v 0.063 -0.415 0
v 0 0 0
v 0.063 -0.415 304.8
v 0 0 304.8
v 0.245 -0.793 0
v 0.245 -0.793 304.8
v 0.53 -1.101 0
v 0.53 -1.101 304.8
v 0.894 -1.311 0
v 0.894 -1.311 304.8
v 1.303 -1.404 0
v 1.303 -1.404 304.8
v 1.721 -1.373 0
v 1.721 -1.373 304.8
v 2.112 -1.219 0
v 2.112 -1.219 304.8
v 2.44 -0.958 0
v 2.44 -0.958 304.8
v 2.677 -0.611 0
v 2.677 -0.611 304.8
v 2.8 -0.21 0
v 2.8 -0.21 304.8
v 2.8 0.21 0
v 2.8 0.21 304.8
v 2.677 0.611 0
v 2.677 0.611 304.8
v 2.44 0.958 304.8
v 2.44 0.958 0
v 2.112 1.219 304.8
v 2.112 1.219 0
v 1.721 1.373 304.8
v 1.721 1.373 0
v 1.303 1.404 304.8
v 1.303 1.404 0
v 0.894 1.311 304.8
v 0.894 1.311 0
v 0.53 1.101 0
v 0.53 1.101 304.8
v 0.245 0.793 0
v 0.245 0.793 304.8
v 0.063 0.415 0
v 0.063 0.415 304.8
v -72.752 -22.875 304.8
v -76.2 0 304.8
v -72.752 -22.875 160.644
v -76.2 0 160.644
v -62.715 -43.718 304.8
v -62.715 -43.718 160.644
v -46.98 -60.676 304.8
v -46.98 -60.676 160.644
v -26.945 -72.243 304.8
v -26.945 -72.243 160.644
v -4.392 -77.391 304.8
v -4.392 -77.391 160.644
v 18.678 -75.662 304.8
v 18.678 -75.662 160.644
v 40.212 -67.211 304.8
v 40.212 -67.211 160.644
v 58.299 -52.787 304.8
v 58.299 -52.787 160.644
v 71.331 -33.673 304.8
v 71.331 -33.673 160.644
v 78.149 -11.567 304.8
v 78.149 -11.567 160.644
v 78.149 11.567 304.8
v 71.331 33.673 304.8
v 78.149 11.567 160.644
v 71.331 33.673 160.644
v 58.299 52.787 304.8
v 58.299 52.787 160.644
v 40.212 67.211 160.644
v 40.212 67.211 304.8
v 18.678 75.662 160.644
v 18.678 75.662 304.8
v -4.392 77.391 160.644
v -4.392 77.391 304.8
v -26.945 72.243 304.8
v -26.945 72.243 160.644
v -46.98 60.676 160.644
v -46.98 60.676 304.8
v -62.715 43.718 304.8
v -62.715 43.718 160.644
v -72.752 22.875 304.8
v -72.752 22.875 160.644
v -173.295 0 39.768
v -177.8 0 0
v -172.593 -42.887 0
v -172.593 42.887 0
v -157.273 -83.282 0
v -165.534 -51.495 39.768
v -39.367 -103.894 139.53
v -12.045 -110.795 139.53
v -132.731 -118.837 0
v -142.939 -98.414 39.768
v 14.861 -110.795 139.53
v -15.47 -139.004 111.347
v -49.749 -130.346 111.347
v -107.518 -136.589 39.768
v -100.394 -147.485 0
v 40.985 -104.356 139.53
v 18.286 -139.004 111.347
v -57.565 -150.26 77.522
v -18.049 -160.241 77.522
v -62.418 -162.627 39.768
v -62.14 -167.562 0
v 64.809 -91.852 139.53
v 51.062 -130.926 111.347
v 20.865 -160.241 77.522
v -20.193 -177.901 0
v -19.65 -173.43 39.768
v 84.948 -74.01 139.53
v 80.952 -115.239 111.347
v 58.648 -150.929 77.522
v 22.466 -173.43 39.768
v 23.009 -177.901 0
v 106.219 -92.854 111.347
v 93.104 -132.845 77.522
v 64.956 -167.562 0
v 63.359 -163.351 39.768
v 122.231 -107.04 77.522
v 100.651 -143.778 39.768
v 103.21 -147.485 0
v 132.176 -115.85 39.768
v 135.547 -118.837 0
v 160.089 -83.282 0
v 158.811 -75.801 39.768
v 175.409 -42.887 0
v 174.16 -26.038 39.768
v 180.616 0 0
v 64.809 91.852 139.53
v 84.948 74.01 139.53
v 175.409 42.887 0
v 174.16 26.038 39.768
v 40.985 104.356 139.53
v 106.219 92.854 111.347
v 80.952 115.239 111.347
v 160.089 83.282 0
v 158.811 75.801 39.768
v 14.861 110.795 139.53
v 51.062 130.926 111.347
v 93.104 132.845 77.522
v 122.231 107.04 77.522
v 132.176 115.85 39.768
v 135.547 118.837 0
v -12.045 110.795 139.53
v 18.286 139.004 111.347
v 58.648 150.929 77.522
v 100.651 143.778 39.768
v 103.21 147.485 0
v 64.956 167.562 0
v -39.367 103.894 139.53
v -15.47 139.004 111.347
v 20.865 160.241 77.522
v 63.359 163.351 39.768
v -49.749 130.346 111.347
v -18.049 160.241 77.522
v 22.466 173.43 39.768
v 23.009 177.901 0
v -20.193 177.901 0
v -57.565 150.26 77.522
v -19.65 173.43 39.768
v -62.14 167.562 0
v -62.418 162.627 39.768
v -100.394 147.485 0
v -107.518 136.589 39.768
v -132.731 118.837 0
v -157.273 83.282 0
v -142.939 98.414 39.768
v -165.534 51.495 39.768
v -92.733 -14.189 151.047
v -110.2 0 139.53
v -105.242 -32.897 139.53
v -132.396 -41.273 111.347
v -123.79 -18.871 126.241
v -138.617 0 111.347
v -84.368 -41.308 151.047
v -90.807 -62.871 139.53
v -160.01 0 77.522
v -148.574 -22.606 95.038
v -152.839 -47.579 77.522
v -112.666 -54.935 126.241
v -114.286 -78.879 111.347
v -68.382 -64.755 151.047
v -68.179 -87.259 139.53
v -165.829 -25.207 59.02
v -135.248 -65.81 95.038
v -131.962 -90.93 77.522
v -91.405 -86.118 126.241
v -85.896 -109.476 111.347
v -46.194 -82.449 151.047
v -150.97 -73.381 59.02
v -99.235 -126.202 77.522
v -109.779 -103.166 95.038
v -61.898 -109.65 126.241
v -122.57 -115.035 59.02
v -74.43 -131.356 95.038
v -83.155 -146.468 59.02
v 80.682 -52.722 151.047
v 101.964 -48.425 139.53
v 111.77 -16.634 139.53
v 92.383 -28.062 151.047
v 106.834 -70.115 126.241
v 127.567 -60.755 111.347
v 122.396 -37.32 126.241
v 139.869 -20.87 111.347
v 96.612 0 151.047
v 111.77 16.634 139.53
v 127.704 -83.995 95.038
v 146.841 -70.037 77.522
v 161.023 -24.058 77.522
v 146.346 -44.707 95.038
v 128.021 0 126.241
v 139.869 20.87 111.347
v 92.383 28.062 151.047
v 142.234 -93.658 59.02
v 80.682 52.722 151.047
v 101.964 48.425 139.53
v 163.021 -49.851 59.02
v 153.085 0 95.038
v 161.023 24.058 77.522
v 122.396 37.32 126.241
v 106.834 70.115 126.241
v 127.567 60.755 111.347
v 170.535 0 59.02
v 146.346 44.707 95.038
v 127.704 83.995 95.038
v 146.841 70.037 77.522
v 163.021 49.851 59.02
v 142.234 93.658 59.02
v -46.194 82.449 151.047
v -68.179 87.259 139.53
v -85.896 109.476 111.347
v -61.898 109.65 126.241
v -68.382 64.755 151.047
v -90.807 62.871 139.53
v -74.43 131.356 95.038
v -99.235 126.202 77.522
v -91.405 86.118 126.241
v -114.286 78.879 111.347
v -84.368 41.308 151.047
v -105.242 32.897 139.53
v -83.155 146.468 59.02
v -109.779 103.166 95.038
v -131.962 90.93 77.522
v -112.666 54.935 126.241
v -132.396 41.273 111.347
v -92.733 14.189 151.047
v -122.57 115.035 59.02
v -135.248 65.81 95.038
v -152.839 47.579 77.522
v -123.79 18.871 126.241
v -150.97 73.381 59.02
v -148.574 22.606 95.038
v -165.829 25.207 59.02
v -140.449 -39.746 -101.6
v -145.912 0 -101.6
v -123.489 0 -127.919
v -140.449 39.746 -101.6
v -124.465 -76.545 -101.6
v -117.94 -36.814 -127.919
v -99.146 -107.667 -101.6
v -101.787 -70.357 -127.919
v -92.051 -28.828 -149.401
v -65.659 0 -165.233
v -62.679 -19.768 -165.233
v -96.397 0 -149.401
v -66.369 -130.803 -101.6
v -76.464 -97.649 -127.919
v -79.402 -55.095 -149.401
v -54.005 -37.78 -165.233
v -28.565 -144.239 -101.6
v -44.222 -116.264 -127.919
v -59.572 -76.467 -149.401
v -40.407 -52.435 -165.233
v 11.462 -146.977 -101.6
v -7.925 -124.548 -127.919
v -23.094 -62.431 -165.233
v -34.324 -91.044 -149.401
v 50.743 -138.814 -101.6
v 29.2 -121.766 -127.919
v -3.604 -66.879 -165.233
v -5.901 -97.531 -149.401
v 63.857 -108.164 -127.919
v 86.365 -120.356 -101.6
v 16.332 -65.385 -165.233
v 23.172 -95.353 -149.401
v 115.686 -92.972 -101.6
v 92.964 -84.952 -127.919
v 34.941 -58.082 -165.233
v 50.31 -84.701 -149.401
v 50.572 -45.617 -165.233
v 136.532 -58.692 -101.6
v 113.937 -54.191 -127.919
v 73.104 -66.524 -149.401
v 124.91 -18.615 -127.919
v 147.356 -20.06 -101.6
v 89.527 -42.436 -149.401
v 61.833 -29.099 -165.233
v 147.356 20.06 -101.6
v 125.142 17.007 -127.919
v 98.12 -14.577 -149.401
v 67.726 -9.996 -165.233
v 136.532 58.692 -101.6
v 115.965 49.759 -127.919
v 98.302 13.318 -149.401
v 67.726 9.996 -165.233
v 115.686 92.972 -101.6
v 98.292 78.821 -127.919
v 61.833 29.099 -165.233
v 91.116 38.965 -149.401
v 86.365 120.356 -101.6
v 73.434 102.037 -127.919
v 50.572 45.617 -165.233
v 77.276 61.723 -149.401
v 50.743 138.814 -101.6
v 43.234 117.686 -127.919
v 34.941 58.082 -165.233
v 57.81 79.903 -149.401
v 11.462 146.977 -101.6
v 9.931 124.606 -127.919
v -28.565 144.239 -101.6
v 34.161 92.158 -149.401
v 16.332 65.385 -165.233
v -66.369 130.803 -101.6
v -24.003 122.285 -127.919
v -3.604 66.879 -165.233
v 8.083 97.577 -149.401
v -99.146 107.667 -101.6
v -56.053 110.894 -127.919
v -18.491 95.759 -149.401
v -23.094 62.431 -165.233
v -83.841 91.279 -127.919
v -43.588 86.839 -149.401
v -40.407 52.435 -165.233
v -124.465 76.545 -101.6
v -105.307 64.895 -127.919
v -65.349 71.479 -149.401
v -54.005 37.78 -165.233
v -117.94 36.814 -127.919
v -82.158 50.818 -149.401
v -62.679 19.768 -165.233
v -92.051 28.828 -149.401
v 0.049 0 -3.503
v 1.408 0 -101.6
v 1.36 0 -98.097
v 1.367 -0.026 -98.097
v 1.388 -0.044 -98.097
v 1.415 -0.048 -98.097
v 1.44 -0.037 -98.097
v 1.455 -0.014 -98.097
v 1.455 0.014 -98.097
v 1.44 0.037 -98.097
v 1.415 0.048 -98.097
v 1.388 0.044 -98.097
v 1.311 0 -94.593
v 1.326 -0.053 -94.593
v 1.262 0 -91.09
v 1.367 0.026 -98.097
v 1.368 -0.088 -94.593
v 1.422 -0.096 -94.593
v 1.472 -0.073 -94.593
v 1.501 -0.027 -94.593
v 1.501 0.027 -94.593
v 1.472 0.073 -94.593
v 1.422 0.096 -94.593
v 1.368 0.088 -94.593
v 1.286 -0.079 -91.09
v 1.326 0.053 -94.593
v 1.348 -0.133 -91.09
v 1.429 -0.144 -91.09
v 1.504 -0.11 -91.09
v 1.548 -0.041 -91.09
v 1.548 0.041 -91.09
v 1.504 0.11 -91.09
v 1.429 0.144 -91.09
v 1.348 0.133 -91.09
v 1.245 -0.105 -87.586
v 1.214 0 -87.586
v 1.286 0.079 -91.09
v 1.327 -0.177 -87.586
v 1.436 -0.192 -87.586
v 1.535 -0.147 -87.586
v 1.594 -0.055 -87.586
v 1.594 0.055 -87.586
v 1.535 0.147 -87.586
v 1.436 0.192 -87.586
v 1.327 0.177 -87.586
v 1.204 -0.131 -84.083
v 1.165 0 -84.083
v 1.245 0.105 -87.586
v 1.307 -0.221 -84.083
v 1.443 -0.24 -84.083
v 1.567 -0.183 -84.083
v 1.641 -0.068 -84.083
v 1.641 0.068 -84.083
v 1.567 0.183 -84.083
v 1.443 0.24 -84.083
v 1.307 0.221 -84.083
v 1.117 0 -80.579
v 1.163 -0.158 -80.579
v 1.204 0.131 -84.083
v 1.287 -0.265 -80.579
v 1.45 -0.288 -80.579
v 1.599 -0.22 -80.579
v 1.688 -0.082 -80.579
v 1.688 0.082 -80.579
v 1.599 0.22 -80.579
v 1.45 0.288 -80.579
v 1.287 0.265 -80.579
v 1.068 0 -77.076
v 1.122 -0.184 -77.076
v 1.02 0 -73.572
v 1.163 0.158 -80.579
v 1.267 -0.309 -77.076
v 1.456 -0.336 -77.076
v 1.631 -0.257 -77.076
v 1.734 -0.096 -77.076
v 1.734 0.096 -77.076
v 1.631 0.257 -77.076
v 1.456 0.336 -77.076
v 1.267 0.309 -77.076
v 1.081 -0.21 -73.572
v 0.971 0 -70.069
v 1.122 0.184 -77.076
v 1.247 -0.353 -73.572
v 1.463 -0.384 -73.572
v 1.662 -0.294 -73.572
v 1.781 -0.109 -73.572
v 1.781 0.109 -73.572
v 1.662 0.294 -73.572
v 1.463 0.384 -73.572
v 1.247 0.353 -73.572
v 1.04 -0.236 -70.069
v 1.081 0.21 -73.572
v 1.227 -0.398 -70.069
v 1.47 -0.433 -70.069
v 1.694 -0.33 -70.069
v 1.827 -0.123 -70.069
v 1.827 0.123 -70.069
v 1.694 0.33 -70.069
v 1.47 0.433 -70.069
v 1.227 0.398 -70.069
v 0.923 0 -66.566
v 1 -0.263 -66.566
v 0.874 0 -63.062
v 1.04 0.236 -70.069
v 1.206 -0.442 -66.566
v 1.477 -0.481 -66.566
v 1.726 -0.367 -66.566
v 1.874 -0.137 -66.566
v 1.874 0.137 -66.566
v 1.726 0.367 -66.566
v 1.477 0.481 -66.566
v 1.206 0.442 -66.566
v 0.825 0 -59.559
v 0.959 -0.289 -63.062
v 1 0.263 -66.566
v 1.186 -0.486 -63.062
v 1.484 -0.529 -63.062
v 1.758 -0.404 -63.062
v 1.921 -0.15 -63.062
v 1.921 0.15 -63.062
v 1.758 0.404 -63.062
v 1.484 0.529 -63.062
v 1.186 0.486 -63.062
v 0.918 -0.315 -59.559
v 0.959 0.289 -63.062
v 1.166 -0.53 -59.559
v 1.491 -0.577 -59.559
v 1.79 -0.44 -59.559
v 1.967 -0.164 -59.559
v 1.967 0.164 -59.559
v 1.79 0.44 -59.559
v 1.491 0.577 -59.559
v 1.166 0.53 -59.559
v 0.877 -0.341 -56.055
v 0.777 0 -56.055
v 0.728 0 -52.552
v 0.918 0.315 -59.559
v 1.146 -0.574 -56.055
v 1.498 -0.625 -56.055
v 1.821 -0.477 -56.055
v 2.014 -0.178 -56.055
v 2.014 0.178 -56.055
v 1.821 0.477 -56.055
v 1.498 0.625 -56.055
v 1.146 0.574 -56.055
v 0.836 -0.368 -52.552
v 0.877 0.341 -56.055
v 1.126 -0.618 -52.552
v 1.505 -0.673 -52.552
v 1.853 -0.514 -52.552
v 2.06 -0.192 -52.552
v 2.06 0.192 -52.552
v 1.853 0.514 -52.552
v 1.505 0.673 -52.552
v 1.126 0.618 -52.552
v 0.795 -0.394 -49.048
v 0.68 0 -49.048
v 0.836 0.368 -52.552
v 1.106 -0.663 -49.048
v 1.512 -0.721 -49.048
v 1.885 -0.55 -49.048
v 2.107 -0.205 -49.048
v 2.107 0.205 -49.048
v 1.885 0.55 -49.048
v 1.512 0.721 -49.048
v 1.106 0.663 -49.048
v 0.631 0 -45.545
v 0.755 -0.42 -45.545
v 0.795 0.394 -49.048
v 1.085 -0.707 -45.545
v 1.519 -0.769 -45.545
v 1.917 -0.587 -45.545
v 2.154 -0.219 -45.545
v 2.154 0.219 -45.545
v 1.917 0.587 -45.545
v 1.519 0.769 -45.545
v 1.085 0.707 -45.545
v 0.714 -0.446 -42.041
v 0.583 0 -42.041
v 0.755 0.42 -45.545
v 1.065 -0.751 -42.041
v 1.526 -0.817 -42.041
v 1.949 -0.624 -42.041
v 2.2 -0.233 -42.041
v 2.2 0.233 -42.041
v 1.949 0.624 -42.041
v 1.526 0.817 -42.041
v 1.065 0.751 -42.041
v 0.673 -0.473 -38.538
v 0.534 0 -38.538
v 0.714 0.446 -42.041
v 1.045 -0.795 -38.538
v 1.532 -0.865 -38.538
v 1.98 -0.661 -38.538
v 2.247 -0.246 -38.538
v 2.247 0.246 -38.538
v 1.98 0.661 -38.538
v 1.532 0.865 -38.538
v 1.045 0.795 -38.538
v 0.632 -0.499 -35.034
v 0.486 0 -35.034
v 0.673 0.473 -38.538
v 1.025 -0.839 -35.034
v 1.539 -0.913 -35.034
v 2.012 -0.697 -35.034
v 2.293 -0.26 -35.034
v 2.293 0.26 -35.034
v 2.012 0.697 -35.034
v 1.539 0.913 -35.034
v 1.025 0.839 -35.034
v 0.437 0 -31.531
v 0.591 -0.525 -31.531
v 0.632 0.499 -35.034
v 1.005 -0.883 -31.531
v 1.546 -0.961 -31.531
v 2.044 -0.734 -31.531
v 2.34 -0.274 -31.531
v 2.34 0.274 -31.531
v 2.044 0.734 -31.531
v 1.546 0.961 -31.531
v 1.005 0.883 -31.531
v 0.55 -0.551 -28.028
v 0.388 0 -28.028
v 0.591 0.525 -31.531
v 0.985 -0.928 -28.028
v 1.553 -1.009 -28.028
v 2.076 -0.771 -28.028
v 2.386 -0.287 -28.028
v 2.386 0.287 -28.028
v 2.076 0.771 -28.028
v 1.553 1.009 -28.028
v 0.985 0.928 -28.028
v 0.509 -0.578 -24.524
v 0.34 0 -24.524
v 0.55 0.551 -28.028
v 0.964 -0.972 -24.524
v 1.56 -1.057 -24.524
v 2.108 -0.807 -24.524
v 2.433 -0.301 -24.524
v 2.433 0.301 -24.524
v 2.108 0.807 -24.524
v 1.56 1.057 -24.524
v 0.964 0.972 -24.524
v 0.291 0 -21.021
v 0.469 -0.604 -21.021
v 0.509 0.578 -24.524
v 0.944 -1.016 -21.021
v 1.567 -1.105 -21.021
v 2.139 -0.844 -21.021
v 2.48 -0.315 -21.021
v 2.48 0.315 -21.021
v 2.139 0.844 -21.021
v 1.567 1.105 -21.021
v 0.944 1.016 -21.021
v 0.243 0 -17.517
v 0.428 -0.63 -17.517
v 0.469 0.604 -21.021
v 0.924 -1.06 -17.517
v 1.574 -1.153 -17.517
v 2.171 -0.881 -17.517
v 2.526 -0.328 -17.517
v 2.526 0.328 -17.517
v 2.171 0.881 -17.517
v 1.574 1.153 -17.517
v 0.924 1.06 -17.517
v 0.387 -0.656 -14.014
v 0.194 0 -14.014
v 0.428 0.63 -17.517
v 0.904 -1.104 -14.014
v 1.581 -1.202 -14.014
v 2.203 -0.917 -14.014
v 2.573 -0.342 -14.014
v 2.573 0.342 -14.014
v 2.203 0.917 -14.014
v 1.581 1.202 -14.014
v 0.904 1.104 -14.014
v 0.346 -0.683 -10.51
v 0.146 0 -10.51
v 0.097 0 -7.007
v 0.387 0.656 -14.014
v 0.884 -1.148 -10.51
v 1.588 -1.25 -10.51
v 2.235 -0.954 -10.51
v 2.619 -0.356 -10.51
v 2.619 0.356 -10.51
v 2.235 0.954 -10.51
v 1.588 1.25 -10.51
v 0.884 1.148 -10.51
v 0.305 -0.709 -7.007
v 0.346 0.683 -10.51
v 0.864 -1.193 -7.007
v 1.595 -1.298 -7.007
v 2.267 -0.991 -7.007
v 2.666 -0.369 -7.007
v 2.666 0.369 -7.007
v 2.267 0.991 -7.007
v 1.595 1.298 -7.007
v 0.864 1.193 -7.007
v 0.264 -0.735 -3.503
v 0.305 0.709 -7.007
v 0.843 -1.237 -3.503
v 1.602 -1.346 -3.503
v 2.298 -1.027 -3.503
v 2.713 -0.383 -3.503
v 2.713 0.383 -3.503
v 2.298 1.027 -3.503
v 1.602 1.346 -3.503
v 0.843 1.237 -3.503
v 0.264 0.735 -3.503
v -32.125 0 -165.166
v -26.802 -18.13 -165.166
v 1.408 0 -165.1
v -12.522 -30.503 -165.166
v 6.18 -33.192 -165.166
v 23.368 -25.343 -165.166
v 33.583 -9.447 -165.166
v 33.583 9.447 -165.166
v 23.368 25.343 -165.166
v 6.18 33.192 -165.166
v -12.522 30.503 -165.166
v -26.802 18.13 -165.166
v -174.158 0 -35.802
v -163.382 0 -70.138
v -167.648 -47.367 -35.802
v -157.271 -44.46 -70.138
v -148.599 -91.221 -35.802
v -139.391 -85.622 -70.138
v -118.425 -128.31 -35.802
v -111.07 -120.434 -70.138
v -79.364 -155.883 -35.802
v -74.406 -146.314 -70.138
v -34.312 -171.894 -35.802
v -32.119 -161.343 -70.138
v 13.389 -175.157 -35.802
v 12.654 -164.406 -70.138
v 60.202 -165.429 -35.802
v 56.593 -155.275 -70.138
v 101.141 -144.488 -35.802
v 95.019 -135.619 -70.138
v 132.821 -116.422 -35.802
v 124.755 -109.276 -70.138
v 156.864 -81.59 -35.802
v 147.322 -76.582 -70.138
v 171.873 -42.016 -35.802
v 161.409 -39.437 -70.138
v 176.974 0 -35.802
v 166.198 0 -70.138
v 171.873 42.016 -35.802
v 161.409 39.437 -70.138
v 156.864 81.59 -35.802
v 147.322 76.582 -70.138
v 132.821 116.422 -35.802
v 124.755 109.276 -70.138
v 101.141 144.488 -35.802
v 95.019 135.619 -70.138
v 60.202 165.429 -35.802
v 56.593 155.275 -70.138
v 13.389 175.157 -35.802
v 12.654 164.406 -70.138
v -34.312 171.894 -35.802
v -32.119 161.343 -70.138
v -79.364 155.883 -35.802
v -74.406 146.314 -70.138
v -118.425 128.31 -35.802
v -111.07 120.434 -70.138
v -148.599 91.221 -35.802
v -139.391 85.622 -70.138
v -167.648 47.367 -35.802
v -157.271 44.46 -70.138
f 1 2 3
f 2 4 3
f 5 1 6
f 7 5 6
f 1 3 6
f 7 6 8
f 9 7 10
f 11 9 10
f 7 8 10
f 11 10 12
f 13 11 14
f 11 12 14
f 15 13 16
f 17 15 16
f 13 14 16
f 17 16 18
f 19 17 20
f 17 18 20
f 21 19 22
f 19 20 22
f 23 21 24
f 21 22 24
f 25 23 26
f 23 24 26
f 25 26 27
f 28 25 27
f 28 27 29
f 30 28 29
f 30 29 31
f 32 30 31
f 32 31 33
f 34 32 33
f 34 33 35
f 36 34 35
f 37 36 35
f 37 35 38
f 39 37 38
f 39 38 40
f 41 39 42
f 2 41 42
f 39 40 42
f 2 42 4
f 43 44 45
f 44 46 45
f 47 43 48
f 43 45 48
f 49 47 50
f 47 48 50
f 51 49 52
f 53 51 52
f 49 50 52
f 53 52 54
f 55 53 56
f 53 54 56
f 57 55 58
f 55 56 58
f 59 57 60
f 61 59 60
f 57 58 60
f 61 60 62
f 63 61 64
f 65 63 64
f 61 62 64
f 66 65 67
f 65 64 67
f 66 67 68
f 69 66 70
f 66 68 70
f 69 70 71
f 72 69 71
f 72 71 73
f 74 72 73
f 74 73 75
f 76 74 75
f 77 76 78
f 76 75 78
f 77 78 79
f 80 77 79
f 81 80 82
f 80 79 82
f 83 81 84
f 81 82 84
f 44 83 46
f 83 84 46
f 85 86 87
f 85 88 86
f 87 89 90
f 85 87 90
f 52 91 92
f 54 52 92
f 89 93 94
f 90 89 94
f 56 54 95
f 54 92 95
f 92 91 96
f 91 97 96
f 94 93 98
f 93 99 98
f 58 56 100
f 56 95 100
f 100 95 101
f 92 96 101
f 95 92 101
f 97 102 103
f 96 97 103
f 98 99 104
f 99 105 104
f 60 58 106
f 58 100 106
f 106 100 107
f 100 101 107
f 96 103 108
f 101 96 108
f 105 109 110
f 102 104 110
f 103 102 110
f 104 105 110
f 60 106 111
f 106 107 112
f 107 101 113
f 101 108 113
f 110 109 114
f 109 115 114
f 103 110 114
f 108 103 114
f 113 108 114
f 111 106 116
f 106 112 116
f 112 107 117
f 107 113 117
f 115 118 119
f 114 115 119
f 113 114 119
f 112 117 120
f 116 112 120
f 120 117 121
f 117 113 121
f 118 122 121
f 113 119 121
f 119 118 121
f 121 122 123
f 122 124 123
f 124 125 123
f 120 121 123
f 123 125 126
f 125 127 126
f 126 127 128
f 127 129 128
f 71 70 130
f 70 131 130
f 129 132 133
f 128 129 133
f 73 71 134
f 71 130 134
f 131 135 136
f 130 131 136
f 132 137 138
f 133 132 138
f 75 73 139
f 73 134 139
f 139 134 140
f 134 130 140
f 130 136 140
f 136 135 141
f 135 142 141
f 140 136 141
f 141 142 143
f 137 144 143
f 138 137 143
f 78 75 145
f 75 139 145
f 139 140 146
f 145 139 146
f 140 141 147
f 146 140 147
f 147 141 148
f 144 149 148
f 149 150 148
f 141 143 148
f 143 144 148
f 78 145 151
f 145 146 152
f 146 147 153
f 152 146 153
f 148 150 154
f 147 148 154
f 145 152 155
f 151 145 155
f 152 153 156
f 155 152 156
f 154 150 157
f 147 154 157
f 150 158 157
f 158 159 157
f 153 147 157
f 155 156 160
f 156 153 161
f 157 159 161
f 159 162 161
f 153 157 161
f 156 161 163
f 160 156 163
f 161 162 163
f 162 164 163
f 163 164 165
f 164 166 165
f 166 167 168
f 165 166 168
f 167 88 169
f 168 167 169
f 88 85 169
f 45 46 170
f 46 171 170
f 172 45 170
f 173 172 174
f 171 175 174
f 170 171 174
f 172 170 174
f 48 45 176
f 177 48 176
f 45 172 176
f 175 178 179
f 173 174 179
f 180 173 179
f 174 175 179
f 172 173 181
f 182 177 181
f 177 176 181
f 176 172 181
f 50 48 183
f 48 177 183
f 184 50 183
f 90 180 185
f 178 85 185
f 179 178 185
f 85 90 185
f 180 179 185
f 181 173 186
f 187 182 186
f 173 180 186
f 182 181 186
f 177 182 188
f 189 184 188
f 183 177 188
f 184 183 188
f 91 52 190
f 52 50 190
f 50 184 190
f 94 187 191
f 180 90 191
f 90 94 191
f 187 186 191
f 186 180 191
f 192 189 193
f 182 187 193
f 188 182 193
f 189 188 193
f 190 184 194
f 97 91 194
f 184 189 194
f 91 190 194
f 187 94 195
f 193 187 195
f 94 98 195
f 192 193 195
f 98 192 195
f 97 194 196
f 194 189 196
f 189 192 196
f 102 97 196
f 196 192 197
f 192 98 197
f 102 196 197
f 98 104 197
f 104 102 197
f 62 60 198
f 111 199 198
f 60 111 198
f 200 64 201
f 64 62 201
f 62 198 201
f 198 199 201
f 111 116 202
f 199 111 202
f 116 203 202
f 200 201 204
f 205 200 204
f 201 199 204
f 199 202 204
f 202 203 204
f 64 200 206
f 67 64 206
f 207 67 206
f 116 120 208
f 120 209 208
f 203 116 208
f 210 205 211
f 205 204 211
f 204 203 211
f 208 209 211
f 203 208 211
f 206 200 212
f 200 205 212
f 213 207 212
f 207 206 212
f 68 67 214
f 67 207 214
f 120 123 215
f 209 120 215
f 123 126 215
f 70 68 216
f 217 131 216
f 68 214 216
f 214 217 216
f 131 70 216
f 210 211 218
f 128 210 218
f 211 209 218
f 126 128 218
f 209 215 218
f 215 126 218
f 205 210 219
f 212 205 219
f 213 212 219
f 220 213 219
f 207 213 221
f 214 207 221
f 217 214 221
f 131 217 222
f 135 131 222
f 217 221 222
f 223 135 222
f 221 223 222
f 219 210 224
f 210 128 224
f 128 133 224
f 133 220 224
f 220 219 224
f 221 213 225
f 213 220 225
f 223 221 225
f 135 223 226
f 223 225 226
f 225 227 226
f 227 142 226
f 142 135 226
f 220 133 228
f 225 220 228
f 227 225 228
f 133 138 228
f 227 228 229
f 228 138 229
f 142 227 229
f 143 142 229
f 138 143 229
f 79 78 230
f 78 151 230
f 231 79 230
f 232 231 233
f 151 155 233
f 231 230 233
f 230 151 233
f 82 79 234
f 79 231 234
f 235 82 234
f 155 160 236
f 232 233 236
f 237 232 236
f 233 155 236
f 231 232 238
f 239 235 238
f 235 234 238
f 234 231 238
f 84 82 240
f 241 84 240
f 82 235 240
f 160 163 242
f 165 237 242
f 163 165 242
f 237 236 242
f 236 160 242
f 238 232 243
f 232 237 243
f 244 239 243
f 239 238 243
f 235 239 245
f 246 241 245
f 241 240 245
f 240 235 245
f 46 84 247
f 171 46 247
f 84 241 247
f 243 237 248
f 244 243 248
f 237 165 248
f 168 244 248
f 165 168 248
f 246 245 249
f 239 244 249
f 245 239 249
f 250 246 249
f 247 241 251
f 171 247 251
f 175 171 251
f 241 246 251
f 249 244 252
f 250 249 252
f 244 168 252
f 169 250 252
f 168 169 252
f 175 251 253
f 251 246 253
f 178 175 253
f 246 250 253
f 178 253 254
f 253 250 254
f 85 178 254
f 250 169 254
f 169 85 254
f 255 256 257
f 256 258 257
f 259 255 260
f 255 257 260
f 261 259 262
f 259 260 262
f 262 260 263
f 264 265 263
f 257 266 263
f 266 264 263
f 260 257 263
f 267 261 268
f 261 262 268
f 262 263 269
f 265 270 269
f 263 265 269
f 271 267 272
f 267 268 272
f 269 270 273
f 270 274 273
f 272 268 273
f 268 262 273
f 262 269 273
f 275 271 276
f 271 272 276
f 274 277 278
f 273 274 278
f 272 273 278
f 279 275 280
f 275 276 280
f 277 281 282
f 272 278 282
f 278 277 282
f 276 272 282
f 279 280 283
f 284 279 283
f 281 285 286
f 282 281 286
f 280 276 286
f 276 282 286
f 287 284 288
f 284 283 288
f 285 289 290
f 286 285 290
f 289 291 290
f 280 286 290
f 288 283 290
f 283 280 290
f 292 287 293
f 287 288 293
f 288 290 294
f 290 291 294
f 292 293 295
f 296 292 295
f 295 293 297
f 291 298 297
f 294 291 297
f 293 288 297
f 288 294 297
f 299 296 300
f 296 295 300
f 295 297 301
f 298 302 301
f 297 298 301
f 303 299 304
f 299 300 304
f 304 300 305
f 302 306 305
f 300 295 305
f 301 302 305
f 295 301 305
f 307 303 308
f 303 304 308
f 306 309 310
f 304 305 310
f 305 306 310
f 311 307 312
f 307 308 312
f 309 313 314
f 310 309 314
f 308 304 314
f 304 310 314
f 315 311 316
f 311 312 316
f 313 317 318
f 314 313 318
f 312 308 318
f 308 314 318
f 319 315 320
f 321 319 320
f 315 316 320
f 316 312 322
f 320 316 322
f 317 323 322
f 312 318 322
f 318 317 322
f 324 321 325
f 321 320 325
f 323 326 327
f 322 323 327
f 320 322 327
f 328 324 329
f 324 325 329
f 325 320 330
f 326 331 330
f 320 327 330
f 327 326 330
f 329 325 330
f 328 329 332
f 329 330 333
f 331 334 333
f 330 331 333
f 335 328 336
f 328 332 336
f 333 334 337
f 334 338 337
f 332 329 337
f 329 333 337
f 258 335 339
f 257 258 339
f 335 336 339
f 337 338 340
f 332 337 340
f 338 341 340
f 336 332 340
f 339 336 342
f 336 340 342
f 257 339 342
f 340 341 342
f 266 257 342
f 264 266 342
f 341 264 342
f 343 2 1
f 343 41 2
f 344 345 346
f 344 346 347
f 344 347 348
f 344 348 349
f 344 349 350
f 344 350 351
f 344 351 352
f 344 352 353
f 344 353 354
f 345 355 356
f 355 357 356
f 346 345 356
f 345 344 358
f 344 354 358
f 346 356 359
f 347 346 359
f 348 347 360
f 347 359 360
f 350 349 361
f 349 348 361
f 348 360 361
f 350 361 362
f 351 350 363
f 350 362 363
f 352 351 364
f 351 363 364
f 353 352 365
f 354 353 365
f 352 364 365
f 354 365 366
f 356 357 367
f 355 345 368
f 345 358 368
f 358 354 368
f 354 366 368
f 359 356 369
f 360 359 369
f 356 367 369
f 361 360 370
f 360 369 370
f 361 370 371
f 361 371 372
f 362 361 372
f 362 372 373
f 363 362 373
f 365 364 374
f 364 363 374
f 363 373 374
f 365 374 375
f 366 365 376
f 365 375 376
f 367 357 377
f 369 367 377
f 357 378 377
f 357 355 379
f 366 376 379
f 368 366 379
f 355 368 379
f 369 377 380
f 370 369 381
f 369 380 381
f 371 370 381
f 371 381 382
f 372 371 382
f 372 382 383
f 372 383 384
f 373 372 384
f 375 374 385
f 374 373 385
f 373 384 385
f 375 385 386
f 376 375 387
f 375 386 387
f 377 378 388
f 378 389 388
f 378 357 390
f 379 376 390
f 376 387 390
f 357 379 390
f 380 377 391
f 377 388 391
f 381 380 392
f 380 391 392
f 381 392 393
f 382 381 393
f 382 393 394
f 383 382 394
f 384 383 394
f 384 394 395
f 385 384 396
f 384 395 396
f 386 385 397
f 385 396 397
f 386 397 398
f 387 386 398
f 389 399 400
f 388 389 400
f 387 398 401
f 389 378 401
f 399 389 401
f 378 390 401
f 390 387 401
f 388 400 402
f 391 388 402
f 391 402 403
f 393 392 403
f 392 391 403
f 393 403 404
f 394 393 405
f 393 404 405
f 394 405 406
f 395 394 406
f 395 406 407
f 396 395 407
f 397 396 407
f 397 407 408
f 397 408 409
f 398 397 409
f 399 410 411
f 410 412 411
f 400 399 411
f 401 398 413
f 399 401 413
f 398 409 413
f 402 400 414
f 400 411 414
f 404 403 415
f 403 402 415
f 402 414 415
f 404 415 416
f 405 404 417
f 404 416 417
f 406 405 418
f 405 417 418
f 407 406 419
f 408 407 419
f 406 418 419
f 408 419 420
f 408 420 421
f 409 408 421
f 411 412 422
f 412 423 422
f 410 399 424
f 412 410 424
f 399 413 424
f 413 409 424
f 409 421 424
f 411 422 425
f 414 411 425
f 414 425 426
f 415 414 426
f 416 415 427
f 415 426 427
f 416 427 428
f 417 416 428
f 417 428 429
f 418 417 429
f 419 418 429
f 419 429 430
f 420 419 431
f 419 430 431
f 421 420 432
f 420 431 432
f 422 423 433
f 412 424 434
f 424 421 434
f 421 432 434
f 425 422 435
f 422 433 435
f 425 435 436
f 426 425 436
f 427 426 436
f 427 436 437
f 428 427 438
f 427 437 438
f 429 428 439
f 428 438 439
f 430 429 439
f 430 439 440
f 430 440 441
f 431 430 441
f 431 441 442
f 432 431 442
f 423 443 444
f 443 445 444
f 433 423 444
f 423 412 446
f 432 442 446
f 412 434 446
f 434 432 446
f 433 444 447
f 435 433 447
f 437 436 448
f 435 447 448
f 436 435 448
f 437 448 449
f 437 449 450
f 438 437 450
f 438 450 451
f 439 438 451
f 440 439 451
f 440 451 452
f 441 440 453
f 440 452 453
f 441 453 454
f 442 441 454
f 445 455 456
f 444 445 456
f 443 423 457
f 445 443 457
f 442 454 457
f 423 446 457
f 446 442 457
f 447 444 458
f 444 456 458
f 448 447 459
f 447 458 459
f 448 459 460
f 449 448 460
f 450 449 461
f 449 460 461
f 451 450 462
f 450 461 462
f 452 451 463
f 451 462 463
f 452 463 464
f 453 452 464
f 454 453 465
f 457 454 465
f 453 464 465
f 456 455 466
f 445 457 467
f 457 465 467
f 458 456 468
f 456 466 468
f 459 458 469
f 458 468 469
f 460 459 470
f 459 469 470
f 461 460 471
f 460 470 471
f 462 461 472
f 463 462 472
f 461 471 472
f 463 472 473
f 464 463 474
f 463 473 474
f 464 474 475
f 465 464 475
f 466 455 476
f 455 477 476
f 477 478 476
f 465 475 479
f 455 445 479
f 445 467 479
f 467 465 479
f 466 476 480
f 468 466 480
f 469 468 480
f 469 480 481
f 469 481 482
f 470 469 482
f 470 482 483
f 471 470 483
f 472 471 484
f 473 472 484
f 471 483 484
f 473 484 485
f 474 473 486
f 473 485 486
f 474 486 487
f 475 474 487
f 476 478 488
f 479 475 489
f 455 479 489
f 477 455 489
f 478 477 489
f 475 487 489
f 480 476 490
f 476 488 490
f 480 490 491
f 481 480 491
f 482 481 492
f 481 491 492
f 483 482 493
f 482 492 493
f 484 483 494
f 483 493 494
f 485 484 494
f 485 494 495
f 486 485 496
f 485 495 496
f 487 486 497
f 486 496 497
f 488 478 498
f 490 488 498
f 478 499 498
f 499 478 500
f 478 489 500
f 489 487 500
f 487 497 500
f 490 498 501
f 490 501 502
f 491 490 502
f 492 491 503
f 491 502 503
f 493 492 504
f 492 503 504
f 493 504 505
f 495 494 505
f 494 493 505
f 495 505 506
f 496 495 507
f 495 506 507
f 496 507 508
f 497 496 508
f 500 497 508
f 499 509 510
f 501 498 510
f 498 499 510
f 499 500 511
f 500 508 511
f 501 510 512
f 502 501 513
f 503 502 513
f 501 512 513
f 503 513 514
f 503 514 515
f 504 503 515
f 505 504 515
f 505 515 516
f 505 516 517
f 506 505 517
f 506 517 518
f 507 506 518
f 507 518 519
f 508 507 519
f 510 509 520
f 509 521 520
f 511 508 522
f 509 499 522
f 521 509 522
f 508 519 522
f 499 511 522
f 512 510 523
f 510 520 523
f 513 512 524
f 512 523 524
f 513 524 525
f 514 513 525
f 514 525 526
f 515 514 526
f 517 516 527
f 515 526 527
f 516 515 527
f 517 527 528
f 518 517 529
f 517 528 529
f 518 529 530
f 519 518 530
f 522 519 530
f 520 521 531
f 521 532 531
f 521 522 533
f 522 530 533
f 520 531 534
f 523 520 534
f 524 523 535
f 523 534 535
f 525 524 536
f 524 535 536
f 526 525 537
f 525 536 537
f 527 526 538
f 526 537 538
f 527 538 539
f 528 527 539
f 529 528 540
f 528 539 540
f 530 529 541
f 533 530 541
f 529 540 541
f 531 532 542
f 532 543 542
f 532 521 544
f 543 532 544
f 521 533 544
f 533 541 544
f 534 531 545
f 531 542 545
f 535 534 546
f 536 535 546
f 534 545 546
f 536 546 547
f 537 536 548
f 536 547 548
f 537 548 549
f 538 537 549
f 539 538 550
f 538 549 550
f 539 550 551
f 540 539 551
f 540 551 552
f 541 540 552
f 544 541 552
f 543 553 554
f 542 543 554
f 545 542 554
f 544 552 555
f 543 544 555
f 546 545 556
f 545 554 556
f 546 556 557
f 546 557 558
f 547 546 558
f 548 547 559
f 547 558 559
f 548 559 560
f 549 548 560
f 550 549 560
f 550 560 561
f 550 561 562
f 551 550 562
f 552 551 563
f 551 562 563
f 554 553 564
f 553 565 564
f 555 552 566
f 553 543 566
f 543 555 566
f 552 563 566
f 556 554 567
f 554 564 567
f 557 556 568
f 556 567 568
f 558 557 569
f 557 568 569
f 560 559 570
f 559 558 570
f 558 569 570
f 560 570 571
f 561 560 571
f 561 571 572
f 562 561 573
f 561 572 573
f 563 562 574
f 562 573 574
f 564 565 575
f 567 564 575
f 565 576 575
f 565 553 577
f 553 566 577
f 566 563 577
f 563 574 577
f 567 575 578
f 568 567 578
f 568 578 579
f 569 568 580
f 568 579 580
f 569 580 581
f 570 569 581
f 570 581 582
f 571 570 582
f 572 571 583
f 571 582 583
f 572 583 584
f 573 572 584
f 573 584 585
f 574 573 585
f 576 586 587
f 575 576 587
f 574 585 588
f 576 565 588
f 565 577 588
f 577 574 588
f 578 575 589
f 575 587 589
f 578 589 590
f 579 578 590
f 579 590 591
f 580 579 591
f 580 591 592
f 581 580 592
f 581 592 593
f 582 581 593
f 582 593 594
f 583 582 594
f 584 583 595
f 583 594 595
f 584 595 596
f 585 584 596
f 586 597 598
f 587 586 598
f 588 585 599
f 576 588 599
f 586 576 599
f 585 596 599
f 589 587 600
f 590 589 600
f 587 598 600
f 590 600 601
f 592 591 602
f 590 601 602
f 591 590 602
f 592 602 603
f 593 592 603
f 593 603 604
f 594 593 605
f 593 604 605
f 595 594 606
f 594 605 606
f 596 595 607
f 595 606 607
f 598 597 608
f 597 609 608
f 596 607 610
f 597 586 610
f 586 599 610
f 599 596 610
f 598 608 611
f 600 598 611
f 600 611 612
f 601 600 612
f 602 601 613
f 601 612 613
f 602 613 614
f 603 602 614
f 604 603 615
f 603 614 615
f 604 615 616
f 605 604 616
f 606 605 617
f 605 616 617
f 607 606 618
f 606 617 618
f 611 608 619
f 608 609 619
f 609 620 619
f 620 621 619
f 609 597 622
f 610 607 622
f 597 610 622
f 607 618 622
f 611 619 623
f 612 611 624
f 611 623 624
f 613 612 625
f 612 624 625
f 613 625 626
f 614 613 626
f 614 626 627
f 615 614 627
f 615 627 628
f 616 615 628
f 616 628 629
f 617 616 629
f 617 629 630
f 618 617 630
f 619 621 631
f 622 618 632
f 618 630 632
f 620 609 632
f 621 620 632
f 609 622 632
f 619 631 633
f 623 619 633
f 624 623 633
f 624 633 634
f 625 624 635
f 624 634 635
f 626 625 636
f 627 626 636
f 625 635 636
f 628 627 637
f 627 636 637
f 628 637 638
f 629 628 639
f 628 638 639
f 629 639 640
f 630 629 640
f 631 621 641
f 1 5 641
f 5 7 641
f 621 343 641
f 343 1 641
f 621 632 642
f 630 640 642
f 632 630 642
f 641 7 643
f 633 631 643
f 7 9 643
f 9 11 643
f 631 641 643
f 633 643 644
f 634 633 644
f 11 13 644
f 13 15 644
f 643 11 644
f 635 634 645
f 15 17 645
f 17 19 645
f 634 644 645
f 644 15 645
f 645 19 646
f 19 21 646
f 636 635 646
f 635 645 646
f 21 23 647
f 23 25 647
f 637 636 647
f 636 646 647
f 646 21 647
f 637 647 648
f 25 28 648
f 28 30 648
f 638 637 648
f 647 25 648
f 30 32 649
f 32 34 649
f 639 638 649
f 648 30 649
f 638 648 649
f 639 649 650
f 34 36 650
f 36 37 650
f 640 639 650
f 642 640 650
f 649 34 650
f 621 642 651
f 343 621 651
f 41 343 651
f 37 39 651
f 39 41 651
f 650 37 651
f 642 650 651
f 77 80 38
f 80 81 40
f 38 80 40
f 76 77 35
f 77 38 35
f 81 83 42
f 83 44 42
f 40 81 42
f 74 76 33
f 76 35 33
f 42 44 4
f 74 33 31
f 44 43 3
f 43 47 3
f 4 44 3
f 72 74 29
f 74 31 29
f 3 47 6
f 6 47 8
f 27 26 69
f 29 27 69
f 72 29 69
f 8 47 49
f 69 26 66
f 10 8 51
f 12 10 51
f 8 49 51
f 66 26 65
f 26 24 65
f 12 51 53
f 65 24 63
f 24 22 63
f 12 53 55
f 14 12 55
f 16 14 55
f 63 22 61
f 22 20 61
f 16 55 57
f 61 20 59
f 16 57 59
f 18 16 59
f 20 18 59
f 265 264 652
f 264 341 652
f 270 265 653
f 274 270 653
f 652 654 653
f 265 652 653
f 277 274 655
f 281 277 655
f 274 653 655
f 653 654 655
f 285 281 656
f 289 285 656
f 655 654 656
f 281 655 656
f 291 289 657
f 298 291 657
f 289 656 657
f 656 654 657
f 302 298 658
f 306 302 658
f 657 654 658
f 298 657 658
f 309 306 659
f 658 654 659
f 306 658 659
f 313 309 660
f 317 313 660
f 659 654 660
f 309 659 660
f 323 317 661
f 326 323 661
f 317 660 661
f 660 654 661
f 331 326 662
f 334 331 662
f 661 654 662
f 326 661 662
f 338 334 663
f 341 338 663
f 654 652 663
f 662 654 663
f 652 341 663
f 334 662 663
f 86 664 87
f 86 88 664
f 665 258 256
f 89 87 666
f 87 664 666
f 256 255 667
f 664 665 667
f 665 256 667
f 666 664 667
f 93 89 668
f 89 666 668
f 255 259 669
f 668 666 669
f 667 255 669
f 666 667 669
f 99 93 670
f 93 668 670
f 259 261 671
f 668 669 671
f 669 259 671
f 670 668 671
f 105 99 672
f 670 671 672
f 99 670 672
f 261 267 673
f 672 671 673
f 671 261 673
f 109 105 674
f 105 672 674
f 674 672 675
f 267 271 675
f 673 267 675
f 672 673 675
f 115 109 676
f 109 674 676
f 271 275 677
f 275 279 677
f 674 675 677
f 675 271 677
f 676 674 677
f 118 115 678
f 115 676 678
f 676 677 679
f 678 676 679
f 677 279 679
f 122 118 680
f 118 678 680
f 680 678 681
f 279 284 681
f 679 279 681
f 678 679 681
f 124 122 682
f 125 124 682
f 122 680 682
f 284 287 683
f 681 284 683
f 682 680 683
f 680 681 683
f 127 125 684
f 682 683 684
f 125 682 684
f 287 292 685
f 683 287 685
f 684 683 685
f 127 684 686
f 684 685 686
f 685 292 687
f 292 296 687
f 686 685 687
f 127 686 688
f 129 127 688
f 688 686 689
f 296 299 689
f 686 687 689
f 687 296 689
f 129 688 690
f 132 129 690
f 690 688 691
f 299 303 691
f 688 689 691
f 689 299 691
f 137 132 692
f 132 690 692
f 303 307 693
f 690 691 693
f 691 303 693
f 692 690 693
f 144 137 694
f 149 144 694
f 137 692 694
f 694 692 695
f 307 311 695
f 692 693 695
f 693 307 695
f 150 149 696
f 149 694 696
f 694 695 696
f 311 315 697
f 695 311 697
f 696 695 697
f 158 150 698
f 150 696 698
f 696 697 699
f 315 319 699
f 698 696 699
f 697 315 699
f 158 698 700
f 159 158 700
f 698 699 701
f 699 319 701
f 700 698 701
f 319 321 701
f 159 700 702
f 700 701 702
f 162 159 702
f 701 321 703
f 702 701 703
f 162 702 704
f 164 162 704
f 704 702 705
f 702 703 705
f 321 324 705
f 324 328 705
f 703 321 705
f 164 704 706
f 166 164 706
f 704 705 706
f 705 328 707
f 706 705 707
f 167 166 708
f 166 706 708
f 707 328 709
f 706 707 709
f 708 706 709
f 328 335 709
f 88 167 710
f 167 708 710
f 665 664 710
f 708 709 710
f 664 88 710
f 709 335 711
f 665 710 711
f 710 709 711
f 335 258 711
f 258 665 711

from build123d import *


# Not quite as in the source:
# - ends of sketch curves that miss each other by under 0.0002 mm in the source are joined
# - a feature names something its author has since deleted; it is built from what else it names


with BuildPart() as f1:
    # F0 (on Front) → F1 (revolve)
    with BuildSketch(Plane.XZ):
        with BuildLine():
            Line((-124.4340789334, 127), (0, 127))
            Line((0, 127), (0, 177.8))
            ThreePointArc((0, 177.8), (-39.0537400688, 173.4579066709), (-76.2, 160.6437051366))
            ThreePointArc((-76.2, 160.6437051366), (-101.7176317641, 145.8299125293), (-124.4340789334, 127))
        make_face()
        with BuildLine():
            Line((-177.8, 0), (0, 0))
            Line((0, 0), (0, 127))
            Line((0, 127), (-124.4340789334, 127))
            ThreePointArc((-124.4340789334, 127), (-163.9164563275, 68.8784098615), (-177.8, 0))
        make_face()
        with BuildLine():
            Line((1.4081087779, -101.6), (0, 0))
            Line((0, 0), (-177.8, 0))
            ThreePointArc((-177.8, 0), (-169.6407590458, -53.2433363939), (-145.9118912221, -101.6))
            Line((-145.9118912221, -101.6), (1.4081087779, -101.6))
        make_face()
        with BuildLine():
            Line((1.4081087779, -165.1), (1.4081087779, -101.6))
            Line((1.4081087779, -101.6), (-145.9118912221, -101.6))
            ThreePointArc((-145.9118912221, -101.6), (-110.4662750061, -139.3199270969), (-65.6586544962, -165.2325061534))
            Line((-65.6586544962, -165.2325061534), (1.4081087779, -165.1))
        make_face()
        with BuildLine():
            ThreePointArc((-76.2, 160.6437051366), (-39.0537400688, 173.4579066709), (0, 177.8))
            Line((0, 177.8), (0, 304.8))
            Line((0, 304.8), (-76.2, 304.8))
            Line((-76.2, 304.8), (-76.2, 160.6437051366))
        make_face()
    revolve(axis=Axis((1.4081087779, 0, -133.35), (0, 0, 1)))


solid = f1.part
